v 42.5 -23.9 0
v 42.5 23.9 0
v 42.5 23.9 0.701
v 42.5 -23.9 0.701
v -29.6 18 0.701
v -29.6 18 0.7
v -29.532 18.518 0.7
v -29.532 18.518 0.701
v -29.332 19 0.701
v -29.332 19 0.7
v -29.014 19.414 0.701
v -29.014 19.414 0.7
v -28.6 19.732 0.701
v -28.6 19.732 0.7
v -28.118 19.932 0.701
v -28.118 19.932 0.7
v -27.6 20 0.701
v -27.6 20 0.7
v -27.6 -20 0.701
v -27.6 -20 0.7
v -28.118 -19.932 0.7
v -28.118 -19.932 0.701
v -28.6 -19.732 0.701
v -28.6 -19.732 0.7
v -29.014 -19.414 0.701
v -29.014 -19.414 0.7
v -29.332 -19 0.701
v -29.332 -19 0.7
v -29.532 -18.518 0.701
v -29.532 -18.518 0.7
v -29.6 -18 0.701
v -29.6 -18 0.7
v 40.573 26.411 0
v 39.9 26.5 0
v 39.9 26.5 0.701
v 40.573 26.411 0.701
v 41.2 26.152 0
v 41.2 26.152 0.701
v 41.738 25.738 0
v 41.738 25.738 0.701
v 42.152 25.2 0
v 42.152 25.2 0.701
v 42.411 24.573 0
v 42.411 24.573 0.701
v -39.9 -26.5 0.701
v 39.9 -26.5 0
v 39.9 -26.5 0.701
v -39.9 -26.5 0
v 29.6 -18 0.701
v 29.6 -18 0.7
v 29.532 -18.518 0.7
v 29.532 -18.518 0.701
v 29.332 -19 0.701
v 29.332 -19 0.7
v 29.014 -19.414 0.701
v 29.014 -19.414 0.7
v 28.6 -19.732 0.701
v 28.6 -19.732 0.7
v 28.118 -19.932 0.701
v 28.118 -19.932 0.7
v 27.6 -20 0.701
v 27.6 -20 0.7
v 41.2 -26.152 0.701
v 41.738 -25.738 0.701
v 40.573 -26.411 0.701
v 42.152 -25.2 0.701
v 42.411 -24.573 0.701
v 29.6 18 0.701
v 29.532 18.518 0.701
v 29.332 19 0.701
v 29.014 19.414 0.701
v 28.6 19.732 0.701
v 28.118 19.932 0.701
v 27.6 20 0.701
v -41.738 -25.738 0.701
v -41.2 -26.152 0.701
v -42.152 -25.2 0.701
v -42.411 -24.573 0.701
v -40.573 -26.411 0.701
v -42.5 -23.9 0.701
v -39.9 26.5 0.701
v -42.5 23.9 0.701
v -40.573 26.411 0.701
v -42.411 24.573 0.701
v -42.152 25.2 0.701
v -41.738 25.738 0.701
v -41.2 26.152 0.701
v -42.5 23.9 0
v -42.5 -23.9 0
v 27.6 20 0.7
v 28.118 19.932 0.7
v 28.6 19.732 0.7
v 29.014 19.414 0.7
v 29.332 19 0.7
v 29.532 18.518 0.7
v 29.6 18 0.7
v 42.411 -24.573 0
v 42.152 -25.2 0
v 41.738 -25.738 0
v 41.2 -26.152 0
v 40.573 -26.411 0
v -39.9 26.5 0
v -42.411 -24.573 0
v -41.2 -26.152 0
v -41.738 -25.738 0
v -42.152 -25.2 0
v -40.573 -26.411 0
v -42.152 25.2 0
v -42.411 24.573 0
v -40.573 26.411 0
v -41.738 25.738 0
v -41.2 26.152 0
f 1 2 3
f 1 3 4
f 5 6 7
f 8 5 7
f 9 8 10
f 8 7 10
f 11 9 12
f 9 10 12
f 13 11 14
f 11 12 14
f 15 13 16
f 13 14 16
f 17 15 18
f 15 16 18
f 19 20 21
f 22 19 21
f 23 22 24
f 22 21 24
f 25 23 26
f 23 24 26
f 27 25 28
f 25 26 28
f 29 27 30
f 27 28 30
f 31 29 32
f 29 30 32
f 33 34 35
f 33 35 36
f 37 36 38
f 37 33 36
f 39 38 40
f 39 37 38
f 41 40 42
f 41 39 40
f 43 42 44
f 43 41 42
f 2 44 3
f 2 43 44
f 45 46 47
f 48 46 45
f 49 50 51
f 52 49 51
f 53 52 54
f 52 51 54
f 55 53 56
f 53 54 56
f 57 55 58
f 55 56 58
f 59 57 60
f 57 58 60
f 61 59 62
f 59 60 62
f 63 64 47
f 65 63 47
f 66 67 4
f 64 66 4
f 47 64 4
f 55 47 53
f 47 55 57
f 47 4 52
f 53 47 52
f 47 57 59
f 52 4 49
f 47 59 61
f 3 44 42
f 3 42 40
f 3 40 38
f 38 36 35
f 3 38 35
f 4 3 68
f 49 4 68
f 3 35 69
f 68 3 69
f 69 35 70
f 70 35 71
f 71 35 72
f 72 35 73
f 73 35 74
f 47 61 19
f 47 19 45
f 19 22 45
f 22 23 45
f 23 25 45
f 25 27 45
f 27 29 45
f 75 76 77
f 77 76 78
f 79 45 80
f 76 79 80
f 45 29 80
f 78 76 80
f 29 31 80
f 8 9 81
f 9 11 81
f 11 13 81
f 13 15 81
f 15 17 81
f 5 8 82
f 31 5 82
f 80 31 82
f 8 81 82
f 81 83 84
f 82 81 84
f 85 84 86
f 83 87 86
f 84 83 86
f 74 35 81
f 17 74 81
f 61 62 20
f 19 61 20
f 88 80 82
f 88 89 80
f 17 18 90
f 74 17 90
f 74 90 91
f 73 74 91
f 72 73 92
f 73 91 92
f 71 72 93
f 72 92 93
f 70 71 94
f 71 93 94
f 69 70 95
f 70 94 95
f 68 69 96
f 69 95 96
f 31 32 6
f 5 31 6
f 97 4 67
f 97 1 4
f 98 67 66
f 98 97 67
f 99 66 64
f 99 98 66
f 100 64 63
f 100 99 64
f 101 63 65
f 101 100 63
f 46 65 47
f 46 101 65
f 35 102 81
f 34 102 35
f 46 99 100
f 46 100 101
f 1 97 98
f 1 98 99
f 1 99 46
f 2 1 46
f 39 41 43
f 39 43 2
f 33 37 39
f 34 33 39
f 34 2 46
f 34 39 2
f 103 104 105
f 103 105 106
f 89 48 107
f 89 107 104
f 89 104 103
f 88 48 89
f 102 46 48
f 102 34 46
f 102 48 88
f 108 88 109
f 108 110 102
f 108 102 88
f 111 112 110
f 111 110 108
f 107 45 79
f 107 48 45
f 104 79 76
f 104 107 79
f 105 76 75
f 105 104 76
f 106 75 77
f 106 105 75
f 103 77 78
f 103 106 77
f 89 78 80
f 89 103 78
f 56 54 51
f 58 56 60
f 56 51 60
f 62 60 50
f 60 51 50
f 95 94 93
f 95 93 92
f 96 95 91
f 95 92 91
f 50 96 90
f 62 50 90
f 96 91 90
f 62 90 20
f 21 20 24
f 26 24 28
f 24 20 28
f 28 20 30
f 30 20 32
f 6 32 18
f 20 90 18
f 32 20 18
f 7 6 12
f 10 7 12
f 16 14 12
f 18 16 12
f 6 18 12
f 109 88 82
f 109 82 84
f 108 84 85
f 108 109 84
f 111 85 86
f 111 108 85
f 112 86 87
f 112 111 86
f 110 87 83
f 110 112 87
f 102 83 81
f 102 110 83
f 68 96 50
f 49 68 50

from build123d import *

# Parameters (mm, degrees)
EXTRUDE_1_DEPTH = 0.7
EXTRUDE_2_DEPTH = 0.001


with BuildPart() as part:
    # Эскиз1 → Бобышка-Вытянуть1 (new body)
    with BuildSketch(Plane.XY):
        with BuildLine():
            Line((-39.9, 26.5), (39.9, 26.5))
            ThreePointArc((39.9, 26.5), (41.738477631, 25.738477631), (42.5, 23.9))
            Line((42.5, 23.9), (42.5, -23.9))
            ThreePointArc((42.5, -23.9), (41.738477631, -25.738477631), (39.9, -26.5))
            Line((39.9, -26.5), (-39.9, -26.5))
            ThreePointArc((-39.9, -26.5), (-41.738477631, -25.738477631), (-42.5, -23.9))
            Line((-42.5, -23.9), (-42.5, 23.9))
            ThreePointArc((-42.5, 23.9), (-41.738477631, 25.738477631), (-39.9, 26.5))
        make_face()
    extrude(amount=EXTRUDE_1_DEPTH)

    # Эскиз2 → Бобышка-Вытянуть2 (add)
    with BuildSketch(Plane.XY.offset(0.7)):
        with BuildLine():
            Line((-42.5, -23.9), (-42.5, 23.9))
            ThreePointArc((-42.5, 23.9), (-41.738477631, 25.738477631), (-39.9, 26.5))
            Line((-39.9, 26.5), (39.9, 26.5))
            ThreePointArc((39.9, 26.5), (41.738477631, 25.738477631), (42.5, 23.9))
            Line((42.5, 23.9), (42.5, -23.9))
            ThreePointArc((42.5, -23.9), (41.738477631, -25.738477631), (39.9, -26.5))
            Line((39.9, -26.5), (-39.9, -26.5))
            ThreePointArc((-39.9, -26.5), (-41.738477631, -25.738477631), (-42.5, -23.9))
        make_face()
        with BuildLine():
            Line((-27.6, 20), (27.6, 20))
            ThreePointArc((27.6, 20), (29.014213562, 19.414213562), (29.6, 18))
            Line((29.6, 18), (29.6, -18))
            ThreePointArc((29.6, -18), (29.014213562, -19.414213562), (27.6, -20))
            Line((27.6, -20), (-27.6, -20))
            ThreePointArc((-27.6, -20), (-29.014213562, -19.414213562), (-29.6, -18))
            Line((-29.6, -18), (-29.6, 18))
            ThreePointArc((-29.6, 18), (-29.014213562, 19.414213562), (-27.6, 20))
        make_face(mode=Mode.SUBTRACT)
    extrude(amount=EXTRUDE_2_DEPTH)


solid = part.part
